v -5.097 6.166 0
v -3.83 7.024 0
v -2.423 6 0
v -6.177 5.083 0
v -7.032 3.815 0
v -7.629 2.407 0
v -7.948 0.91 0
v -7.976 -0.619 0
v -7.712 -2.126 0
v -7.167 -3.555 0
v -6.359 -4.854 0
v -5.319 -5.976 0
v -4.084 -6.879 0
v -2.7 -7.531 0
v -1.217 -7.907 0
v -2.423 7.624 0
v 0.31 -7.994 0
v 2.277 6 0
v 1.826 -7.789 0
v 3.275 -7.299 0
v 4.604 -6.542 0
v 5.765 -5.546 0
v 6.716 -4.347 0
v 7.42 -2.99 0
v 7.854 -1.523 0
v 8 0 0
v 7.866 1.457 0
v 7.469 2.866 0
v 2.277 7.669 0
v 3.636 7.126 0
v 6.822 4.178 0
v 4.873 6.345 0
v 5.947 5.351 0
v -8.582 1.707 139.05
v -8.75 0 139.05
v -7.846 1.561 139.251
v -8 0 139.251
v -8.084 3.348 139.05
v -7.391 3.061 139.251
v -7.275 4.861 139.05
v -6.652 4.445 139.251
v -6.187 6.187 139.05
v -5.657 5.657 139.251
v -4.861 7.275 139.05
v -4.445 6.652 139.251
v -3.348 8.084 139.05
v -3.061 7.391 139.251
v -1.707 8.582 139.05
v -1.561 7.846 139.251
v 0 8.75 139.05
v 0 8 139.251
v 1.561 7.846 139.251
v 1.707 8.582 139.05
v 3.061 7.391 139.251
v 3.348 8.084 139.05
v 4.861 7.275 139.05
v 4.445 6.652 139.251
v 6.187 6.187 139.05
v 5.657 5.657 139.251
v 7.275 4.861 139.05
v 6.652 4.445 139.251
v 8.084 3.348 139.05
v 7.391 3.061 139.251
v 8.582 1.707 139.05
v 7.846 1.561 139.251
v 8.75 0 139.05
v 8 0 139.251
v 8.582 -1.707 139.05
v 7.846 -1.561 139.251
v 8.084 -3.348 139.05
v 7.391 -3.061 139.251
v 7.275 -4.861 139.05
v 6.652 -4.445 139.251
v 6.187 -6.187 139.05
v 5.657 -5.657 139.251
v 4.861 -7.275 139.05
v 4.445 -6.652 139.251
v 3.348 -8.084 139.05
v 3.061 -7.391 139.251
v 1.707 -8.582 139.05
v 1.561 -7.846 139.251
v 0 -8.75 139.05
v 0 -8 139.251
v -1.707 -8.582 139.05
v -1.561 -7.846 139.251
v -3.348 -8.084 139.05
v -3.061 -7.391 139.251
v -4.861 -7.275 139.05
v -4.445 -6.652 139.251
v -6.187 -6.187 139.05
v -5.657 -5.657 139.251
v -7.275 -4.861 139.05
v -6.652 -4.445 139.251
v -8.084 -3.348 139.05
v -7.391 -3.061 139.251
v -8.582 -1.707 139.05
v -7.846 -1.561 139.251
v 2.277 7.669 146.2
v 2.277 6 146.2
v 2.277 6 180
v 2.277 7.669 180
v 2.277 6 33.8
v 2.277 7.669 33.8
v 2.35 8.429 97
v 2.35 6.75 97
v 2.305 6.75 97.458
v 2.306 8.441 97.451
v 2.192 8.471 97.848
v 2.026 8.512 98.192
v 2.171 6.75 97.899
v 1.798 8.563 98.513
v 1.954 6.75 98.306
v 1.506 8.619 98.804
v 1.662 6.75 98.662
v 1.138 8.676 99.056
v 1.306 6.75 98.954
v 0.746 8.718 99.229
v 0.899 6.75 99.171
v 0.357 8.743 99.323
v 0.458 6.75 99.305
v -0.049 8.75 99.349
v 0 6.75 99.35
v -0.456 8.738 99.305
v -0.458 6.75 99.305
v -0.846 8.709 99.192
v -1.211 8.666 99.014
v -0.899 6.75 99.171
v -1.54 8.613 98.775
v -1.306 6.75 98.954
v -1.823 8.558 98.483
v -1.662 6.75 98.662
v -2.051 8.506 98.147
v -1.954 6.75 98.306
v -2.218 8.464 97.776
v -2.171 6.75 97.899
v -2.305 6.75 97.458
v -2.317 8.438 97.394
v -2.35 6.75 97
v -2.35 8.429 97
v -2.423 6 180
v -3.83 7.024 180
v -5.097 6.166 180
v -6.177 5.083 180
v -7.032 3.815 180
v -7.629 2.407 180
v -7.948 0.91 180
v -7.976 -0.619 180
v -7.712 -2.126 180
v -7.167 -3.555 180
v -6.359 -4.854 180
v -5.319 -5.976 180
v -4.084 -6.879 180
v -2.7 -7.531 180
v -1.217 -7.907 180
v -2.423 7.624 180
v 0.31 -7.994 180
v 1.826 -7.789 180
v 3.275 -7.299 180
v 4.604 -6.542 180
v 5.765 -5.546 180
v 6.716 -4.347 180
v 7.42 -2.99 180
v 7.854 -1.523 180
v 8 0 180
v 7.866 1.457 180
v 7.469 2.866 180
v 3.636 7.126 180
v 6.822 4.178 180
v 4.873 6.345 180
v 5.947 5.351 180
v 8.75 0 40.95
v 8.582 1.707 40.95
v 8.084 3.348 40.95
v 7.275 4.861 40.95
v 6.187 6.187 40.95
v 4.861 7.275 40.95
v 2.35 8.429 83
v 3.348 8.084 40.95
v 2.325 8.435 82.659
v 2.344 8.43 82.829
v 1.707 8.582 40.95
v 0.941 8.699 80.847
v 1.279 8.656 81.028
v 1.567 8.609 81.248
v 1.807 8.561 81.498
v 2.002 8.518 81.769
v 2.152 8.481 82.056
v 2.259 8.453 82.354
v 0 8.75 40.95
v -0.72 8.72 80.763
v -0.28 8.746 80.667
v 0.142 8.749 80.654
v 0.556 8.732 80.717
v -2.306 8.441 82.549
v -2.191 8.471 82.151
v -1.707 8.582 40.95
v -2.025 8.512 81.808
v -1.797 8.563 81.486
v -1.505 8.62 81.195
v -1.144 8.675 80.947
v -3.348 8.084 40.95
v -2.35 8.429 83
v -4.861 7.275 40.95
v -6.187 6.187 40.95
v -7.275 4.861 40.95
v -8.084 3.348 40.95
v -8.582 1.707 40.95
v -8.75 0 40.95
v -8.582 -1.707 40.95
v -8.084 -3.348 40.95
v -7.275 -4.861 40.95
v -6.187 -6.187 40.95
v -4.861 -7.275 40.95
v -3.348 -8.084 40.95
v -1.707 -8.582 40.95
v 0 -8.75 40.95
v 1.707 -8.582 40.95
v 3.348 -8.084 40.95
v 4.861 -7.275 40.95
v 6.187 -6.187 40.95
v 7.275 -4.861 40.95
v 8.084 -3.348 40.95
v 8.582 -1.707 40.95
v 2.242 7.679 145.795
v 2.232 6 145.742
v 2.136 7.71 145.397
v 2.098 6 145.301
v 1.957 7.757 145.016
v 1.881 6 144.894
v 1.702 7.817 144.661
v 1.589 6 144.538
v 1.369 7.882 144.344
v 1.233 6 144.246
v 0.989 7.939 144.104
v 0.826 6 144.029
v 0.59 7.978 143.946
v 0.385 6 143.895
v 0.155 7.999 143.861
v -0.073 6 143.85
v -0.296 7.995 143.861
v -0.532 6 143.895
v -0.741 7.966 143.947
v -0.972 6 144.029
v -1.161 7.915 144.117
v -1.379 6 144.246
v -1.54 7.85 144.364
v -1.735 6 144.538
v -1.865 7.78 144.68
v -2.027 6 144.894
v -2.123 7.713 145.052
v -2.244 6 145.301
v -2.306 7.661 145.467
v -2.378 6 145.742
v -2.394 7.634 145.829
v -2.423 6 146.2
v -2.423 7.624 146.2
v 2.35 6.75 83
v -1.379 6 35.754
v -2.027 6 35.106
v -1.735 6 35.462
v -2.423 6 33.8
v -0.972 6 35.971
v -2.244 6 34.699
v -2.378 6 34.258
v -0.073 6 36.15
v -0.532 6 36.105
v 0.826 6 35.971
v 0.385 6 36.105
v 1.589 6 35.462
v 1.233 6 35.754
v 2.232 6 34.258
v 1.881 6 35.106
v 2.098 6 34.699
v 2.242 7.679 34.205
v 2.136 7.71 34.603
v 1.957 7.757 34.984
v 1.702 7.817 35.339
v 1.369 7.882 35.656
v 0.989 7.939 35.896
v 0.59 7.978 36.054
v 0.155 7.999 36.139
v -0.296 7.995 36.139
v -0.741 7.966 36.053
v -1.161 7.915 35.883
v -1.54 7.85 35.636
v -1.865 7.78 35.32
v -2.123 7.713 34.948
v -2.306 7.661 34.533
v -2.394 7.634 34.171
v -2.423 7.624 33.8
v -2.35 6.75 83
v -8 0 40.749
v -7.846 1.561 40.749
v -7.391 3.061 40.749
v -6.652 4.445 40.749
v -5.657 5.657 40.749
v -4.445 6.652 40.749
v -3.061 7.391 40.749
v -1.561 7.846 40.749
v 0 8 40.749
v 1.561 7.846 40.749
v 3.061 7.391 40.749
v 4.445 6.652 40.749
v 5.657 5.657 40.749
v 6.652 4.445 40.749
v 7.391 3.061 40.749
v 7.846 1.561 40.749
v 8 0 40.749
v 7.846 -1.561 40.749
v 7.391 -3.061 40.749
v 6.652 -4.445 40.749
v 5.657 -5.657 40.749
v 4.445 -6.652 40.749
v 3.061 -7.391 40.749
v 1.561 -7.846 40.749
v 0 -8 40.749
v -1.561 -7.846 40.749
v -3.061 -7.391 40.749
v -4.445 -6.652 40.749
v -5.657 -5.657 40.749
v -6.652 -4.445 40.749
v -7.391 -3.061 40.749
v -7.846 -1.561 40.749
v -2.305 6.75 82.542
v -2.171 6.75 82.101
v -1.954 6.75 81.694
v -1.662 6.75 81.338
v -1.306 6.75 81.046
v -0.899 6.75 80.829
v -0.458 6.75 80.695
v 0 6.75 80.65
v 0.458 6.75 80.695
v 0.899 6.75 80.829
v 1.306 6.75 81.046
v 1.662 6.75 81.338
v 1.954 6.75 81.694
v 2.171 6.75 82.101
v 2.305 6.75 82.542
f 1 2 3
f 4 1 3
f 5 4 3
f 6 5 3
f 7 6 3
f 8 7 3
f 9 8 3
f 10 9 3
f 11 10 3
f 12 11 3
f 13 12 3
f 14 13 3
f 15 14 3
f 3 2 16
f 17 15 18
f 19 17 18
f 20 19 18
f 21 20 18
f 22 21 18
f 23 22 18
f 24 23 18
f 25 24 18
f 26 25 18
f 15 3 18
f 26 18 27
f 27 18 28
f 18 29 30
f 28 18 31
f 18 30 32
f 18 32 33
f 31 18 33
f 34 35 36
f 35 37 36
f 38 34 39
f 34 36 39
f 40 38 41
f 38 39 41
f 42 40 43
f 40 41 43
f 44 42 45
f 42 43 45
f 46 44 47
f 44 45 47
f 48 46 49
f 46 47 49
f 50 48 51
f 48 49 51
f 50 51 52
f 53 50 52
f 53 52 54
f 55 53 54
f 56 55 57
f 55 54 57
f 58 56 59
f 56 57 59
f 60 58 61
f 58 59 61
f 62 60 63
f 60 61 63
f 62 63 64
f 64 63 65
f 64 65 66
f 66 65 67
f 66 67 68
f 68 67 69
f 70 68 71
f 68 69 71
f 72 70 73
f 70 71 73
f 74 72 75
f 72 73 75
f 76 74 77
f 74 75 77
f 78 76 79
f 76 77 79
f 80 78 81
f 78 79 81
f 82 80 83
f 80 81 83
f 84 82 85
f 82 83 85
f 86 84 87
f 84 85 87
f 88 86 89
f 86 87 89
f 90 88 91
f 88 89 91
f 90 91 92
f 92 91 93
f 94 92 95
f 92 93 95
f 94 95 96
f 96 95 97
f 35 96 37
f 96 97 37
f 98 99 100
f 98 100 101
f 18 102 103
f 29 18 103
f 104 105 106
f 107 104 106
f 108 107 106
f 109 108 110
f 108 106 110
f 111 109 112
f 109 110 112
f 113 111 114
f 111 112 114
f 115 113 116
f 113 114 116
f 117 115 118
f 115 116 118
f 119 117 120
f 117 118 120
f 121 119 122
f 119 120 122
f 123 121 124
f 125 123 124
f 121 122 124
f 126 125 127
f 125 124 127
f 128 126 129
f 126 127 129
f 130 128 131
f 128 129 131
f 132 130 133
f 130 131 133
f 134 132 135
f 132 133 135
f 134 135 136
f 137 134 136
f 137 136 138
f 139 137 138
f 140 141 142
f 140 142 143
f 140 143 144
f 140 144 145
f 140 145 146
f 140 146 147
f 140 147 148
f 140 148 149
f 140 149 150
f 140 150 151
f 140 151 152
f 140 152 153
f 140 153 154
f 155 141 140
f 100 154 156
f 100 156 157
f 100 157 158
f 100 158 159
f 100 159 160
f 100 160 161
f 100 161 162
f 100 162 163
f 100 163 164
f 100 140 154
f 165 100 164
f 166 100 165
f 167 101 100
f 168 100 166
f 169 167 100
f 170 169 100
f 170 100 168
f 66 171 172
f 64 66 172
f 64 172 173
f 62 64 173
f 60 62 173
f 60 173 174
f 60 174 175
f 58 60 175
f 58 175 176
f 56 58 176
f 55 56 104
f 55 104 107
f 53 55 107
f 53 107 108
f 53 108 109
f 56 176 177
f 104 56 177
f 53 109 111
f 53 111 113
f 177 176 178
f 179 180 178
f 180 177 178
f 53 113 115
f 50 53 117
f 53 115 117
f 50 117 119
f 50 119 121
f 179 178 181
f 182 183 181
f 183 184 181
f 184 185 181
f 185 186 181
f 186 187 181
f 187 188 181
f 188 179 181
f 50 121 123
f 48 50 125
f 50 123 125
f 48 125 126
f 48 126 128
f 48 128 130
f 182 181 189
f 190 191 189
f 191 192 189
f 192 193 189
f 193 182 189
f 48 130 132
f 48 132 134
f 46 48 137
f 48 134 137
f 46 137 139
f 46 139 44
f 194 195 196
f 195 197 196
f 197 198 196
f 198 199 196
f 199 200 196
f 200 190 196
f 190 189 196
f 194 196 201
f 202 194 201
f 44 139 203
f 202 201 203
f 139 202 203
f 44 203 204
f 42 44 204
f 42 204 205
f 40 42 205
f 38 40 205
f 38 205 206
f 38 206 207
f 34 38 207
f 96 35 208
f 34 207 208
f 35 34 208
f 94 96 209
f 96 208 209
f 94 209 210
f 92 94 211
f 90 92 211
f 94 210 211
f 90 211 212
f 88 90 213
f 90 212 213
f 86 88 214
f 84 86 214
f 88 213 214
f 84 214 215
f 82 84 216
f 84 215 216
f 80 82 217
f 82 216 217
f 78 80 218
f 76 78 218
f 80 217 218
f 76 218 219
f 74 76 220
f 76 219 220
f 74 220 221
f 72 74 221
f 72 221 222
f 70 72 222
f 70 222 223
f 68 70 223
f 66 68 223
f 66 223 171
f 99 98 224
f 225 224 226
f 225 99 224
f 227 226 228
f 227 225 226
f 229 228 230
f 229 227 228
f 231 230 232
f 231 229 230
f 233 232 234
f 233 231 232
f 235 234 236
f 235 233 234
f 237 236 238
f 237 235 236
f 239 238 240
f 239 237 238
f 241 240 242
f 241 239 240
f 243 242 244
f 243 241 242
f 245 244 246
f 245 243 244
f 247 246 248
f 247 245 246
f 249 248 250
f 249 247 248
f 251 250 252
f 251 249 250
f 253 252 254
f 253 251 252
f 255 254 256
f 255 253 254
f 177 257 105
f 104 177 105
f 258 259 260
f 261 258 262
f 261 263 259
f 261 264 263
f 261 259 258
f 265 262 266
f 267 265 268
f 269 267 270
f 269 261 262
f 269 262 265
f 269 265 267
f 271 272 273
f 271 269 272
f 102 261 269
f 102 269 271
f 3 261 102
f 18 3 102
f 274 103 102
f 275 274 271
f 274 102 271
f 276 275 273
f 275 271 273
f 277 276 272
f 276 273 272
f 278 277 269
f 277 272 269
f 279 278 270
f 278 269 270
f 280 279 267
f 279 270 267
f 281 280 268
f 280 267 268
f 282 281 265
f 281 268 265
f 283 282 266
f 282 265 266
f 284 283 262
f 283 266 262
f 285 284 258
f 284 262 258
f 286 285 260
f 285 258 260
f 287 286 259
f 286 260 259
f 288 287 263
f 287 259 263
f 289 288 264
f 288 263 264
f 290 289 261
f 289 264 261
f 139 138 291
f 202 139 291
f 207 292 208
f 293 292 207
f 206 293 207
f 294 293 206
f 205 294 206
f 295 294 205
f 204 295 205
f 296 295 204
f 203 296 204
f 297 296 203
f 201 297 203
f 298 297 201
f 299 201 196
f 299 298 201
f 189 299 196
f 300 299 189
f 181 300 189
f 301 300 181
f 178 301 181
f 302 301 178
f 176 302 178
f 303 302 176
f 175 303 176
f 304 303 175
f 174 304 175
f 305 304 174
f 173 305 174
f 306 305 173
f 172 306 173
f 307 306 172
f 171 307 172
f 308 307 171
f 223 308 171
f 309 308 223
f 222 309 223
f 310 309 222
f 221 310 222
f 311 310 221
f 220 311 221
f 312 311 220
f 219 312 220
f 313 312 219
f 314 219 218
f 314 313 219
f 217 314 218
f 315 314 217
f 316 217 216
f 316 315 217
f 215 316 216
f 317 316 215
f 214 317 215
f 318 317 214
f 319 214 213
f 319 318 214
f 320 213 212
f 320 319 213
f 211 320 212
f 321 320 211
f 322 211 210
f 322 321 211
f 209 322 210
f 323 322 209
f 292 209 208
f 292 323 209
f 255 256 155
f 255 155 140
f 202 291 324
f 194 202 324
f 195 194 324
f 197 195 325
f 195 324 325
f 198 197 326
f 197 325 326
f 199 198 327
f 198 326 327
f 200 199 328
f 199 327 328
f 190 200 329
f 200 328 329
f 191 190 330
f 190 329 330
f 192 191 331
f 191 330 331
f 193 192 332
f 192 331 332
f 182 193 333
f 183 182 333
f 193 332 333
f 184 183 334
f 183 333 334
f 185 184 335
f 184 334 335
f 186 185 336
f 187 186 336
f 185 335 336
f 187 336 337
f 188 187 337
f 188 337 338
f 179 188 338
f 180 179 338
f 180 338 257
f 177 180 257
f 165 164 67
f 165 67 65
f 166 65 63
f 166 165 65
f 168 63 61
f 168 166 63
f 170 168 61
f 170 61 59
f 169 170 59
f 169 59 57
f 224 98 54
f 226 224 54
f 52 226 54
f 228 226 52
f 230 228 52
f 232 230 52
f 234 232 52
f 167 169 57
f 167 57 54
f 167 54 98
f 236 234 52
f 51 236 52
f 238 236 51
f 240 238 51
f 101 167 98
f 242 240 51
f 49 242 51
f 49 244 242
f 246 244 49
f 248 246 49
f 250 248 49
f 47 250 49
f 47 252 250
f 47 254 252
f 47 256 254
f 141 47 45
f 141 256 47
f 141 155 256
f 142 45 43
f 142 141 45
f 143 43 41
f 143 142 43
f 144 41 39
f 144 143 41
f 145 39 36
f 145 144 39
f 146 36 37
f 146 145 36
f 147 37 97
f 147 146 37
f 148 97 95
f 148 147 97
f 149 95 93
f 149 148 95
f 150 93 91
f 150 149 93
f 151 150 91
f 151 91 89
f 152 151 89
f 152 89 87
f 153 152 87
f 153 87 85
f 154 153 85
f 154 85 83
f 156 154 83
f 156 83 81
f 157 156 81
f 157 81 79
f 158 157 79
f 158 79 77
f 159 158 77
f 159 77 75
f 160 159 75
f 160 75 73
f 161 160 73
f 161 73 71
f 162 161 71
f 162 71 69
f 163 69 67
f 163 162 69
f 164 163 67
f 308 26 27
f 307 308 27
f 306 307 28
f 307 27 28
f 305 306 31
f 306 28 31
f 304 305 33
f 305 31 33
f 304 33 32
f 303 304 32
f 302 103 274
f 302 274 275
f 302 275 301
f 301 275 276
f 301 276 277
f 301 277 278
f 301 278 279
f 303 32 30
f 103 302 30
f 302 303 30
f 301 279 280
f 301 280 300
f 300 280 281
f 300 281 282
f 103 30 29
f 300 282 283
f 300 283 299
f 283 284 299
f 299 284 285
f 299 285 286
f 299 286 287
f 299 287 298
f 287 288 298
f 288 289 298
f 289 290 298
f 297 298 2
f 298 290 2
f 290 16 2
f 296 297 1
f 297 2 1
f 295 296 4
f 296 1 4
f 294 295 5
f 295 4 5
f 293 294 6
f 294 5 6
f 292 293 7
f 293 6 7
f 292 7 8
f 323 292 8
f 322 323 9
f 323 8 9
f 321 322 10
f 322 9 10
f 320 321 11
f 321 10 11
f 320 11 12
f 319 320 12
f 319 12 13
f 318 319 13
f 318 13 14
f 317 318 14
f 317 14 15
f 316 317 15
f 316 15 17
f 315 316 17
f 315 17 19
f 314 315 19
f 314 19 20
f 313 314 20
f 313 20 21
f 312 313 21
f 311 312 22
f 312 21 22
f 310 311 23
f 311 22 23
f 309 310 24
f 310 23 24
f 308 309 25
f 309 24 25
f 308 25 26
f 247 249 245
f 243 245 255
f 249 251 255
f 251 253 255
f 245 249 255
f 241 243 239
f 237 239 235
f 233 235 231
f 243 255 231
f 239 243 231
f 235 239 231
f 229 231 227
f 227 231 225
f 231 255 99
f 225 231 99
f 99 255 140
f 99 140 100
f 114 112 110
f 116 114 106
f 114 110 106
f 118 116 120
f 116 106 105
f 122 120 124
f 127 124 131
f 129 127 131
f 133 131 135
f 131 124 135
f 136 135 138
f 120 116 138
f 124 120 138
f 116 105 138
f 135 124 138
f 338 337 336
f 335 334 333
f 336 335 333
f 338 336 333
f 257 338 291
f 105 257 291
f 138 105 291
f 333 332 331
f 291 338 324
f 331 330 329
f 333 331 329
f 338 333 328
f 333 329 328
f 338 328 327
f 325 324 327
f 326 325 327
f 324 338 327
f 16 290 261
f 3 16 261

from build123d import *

# Parameters (mm, degrees)
SKETCH1_R           = 8.75
BOSS_EXTRUDE1_DEPTH = 180
SKETCH2_R           = 8.75
SKETCH2_R_2         = 8
CUT_EXTRUDE1_DEPTH  = 40.95
CUT_EXTRUDE2_DEPTH  = 33.8
CUT_EXTRUDE3_DEPTH  = 33.8
CUT_EXTRUDE4_DEPTH  = 33.8
SKETCH7_R           = 8.75
BOSS_EXTRUDE2_DEPTH = 7.8
SKETCH9_R           = 8.75
BOSS_EXTRUDE3_DEPTH = 0.3
BOSS_EXTRUDE3_TAPER = 75


with BuildPart() as part:
    # Sketch1 → Boss-Extrude1 (new body)
    with BuildSketch(Plane.XY):
        Circle(SKETCH1_R)
    extrude(amount=BOSS_EXTRUDE1_DEPTH)

    # Sketch2 → Cut-Extrude1 (cut)
    with BuildSketch(Plane.XY.offset(180)):
        Circle(SKETCH2_R)
        Circle(SKETCH2_R_2, mode=Mode.SUBTRACT)
    cut_extrude1 = extrude(amount=-CUT_EXTRUDE1_DEPTH, mode=Mode.SUBTRACT)

    # Sketch3 → Cut-Extrude2 (cut)
    with BuildSketch(Plane.XY.offset(180)):
        with BuildLine():
            Line((-2.423043871, 5.999555366), (2.276956129, 5.999555366))
            Line((2.276956129, 5.999555366), (2.276956129, 7.669124513))
            ThreePointArc((2.276956129, 7.669124513), (-0.076415462, 7.999635034), (-2.423043871, 7.62422838))
            Line((-2.423043871, 7.62422838), (-2.423043871, 5.999555366))
        make_face()
    cut_extrude2 = extrude(amount=-CUT_EXTRUDE2_DEPTH, mode=Mode.SUBTRACT)

    # Sketch4 → Cut-Extrude3 (cut)
    with BuildSketch(Plane(origin=(0, 5.999555366, 0), x_dir=(1, 0, 0), z_dir=(0, 1, 0))):
        with BuildLine():
            Line((-2.423043871, -146.2), (2.276956129, -146.2))
            ThreePointArc((2.276956129, -146.2), (-0.073043871, -143.85), (-2.423043871, -146.2))
        make_face()
    cut_extrude3 = extrude(amount=CUT_EXTRUDE3_DEPTH, mode=Mode.SUBTRACT)

    # Mirror1: Cut-Extrude1, Cut-Extrude2, Cut-Extrude3 across plane
    add(cut_extrude1.mirror(Plane.XY.offset(90)), mode=Mode.SUBTRACT)
    add(cut_extrude2.mirror(Plane.XY.offset(90)), mode=Mode.SUBTRACT)
    add(cut_extrude3.mirror(Plane.XY.offset(90)), mode=Mode.SUBTRACT)

    # Sketch6 → Cut-Extrude4 (cut)
    with BuildSketch(Plane(origin=(0, 6.75, 0), x_dir=(1, 0, 0), z_dir=(0, 1, 0))):
        with BuildLine():
            Line((-2.35, -97), (-2.35, -83))
            ThreePointArc((-2.35, -83), (0, -80.65), (2.35, -83))
            Line((2.35, -83), (2.35, -97))
            ThreePointArc((2.35, -97), (0, -99.35), (-2.35, -97))
        make_face()
    extrude(amount=CUT_EXTRUDE4_DEPTH, mode=Mode.SUBTRACT)

    # Sketch7 → Boss-Extrude2 (add)
    with BuildSketch(Plane(origin=(0, 0, 40.95), x_dir=(-1, 0, 0), z_dir=(0, 0, -1))):
        Circle(SKETCH7_R)
    extrude(amount=-BOSS_EXTRUDE2_DEPTH)

    # Sketch9 → Boss-Extrude3 (add)
    with BuildSketch(Plane(origin=(0, 0, 40.95), x_dir=(-1, 0, 0), z_dir=(0, 0, -1))):
        Circle(SKETCH9_R)
    boss_extrude3 = extrude(amount=BOSS_EXTRUDE3_DEPTH, taper=BOSS_EXTRUDE3_TAPER)

    # Mirror4: Boss-Extrude3 across plane
    add(boss_extrude3.mirror(Plane.XY.offset(90)))


solid = part.part
